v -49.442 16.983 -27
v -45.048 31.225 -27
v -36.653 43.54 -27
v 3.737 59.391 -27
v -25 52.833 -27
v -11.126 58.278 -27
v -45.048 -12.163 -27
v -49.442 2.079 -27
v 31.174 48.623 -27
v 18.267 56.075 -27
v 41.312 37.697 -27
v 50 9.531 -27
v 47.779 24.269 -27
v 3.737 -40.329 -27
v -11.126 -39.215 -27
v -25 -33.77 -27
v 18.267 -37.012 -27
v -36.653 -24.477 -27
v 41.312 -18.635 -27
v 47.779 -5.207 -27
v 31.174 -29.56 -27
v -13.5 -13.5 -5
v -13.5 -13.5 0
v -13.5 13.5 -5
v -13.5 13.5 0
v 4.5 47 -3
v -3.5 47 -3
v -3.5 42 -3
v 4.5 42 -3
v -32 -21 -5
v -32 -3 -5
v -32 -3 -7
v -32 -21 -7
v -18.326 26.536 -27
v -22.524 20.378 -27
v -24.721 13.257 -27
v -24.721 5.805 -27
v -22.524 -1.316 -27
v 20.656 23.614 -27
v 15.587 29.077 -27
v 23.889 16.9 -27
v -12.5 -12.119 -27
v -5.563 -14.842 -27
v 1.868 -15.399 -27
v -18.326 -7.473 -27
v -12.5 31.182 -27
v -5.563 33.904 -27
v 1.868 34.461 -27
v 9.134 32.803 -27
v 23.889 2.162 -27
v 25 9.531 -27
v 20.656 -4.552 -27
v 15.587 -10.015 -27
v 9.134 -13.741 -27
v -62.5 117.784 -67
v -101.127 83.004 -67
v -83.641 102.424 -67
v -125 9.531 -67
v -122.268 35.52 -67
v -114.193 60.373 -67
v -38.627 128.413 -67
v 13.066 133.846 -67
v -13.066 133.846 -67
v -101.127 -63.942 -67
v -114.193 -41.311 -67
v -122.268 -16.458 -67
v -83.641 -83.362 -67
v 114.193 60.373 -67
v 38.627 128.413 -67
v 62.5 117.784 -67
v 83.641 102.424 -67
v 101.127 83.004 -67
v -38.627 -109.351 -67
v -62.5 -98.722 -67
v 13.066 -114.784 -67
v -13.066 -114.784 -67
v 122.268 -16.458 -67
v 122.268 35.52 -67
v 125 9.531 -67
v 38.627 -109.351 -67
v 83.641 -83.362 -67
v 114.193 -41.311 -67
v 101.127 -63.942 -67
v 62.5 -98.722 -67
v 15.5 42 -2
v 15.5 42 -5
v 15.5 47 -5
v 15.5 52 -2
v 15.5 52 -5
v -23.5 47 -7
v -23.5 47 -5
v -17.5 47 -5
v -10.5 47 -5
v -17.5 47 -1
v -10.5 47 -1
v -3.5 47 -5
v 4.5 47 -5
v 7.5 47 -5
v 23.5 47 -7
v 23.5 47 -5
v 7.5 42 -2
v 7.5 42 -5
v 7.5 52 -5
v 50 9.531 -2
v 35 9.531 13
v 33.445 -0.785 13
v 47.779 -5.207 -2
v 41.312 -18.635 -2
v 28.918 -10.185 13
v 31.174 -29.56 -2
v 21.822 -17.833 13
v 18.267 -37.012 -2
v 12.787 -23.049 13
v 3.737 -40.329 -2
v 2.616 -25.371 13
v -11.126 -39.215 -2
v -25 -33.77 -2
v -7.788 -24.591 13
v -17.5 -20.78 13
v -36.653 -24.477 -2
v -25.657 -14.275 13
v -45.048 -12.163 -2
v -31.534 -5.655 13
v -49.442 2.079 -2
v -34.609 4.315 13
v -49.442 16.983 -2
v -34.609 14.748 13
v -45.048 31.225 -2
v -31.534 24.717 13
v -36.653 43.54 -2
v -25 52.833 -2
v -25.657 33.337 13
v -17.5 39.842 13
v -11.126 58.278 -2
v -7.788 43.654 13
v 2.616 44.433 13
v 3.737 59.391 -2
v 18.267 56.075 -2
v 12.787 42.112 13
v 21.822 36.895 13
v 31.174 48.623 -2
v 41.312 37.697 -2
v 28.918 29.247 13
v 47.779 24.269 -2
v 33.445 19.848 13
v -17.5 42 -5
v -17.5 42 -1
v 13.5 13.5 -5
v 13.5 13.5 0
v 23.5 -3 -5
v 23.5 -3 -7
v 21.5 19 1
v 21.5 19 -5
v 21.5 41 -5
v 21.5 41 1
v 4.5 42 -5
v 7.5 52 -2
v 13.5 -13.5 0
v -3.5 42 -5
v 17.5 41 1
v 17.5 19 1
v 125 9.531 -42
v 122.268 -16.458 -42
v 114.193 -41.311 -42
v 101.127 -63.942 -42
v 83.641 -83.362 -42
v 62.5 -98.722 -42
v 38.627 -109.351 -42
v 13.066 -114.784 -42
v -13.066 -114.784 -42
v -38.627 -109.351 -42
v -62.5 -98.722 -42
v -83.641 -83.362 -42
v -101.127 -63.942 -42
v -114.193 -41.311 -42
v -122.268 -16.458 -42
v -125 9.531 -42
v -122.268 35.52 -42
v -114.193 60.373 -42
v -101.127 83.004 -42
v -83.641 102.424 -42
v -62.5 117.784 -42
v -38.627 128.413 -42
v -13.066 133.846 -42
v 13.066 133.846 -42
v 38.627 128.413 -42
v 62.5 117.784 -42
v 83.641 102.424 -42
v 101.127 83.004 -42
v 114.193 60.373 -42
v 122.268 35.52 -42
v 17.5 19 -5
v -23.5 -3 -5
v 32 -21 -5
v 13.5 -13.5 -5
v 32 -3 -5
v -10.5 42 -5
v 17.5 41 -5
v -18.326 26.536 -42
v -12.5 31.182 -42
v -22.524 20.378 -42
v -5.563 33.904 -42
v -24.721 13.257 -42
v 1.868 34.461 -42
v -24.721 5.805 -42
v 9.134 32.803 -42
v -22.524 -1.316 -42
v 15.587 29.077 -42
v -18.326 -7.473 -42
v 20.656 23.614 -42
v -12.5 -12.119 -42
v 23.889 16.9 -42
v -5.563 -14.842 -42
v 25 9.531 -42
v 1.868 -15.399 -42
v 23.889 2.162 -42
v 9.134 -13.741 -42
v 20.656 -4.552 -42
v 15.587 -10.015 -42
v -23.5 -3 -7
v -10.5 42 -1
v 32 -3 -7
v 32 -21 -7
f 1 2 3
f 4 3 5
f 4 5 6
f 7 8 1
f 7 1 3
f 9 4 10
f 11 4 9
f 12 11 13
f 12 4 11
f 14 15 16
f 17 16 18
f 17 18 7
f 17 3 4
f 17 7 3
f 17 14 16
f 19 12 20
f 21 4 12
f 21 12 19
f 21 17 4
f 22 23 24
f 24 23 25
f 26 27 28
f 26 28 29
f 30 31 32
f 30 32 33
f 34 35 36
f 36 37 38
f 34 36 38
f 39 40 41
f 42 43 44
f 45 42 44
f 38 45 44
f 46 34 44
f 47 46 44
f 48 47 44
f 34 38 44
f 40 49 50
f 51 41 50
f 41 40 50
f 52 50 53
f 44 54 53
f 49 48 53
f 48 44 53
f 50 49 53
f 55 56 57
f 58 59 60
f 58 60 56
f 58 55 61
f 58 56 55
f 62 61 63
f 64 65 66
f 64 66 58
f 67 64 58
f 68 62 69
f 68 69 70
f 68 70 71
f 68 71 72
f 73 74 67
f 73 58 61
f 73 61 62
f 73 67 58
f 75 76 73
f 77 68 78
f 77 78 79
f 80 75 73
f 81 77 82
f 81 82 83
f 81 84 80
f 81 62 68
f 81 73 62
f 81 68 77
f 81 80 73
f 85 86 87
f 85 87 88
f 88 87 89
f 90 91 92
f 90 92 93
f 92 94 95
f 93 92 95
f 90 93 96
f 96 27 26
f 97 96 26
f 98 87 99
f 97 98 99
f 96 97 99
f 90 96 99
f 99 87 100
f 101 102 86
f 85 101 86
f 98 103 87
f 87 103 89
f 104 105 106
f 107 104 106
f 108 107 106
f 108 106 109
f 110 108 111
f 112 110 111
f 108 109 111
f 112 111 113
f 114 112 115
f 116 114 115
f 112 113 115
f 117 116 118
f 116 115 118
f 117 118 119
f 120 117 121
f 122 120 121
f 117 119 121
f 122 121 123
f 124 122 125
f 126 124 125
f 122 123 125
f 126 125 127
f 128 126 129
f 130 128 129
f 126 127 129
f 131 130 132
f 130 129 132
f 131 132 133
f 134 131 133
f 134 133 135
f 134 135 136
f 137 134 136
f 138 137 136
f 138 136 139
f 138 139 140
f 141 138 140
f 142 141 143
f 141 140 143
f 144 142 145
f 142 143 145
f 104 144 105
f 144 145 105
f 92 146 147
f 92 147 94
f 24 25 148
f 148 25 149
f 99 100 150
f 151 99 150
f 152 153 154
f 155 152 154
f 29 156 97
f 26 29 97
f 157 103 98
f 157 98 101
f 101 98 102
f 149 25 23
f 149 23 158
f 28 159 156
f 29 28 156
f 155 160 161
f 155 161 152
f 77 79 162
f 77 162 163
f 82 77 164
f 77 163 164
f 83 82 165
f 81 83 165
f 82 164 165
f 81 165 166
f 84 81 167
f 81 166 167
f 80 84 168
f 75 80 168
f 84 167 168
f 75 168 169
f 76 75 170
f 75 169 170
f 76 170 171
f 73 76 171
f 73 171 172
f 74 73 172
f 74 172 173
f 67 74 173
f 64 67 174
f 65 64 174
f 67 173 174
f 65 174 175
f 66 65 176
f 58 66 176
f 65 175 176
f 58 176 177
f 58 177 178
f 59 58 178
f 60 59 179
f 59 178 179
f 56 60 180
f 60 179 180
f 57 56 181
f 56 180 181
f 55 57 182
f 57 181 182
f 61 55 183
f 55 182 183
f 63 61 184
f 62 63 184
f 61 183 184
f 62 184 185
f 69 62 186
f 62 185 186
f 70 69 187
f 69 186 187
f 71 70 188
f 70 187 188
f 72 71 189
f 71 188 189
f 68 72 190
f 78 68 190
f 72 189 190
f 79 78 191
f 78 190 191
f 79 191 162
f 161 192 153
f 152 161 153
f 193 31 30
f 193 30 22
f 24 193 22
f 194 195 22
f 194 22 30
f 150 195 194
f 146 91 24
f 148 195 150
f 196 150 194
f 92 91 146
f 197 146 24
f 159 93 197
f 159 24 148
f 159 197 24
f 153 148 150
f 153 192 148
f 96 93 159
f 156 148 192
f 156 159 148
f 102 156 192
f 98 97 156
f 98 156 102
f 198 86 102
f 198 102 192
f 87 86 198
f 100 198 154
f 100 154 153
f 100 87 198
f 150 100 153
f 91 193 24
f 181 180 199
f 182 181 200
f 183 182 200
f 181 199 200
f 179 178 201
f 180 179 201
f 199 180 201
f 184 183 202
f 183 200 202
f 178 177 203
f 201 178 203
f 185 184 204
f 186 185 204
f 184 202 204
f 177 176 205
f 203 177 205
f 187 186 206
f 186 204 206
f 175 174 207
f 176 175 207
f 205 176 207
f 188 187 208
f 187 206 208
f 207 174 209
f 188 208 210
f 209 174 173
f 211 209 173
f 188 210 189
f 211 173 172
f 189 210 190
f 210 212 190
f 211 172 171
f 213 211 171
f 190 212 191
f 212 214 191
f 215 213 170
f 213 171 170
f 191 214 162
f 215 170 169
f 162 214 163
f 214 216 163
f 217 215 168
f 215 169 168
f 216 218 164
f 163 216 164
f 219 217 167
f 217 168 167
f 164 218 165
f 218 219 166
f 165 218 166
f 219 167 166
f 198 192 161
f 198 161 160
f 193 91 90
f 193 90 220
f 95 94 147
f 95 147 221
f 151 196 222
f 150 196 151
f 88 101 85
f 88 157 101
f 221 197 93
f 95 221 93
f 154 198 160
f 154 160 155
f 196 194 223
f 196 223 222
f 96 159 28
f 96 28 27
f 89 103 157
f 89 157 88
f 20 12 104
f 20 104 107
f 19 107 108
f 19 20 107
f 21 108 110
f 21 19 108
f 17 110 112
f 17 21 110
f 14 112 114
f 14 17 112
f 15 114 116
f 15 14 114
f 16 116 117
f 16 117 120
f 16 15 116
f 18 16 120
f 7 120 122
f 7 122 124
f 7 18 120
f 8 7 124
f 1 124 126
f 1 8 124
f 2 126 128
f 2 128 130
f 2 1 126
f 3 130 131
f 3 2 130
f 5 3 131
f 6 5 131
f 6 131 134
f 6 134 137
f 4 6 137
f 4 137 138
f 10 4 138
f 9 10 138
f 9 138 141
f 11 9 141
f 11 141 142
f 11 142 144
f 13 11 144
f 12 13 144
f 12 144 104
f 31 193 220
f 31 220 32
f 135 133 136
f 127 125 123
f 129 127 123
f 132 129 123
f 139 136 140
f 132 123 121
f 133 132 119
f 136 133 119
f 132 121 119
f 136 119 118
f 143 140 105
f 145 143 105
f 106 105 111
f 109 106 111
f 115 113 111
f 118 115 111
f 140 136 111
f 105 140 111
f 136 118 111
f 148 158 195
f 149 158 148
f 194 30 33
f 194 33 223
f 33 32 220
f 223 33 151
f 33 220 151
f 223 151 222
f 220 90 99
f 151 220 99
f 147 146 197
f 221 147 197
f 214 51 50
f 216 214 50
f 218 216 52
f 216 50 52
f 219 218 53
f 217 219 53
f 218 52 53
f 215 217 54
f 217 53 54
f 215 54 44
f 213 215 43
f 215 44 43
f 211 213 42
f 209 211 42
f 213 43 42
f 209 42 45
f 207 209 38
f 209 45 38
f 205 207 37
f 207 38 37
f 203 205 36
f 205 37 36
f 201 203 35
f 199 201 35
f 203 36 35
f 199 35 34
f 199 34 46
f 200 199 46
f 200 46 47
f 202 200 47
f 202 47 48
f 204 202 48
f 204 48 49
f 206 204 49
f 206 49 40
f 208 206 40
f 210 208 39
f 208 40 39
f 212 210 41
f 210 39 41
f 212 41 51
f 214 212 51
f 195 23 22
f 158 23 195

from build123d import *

# Parameters (mm, degrees)
F0_W           = 27
F0_H           = 27
F1_DEPTH       = 2
F3_W           = 47
F3_H           = 50
F4_DEPTH       = 2
F6_DEPTH       = 2
F7_DEPTH       = 3
F8_W           = 8
F8_H           = 5
F9_DEPTH       = 2
F10_W          = 8
F10_H          = 5
F11_DEPTH      = 3
F12_W          = 4
F12_H          = 22
F13_DEPTH      = 6
F14_W          = 7
F14_H          = 5
F15_DEPTH      = 4
F16_R          = 50
F16_R_2        = 47.5
F17_DEPTH      = 20
F17_DEPTH_BACK = 20
F18_SIZE       = 15
F19_R          = 25
F20_DEPTH      = 15
F21_R          = 125
F21_R_2        = 25
F22_DEPTH      = 25


with BuildPart() as f1:
    # F0 (on Top) → F1 (new body)
    with BuildSketch(Plane.XY):
        Rectangle(F0_W, F0_H)
    extrude(amount=-F1_DEPTH)


with BuildPart() as f4:
    # F3 (on offset) → F4 (new body)
    with BuildSketch(Plane(origin=(0, 0, -5), x_dir=(1, 0, 0), z_dir=(0, 0, -1))):
        with Locations((0, -22)):
            Rectangle(F3_W, F3_H)
    extrude(amount=F4_DEPTH)

    # F5 (on face) → F6 (join)
    with BuildSketch(Plane.XY.offset(-5)):
        Polygon((32, -21), (32, -3), (23.5, -3), (-23.5, -3), (-32, -3), (-32, -21), align=None)
    extrude(amount=-F6_DEPTH)

    # F8 (on face) → F9 (join)
    with BuildSketch(Plane.XY.offset(-5)):
        with Locations((0.5, 44.5)):
            Rectangle(F8_W, F8_H)
    extrude(amount=F9_DEPTH)

    # F10 (on face) → F11 (join)
    with BuildSketch(Plane.XY.offset(-5)):
        with Locations((11.5, 44.5)):
            Rectangle(F10_W, F10_H)
        with Locations((11.5, 49.5)):
            Rectangle(F10_W, F10_H)
    extrude(amount=F11_DEPTH)

    # F12 (on face) → F13 (join)
    with BuildSketch(Plane.XY.offset(-5)):
        with Locations((19.5, 30)):
            Rectangle(F12_W, F12_H)
    extrude(amount=F13_DEPTH)


with BuildPart() as f7:
    # F7 (new, through all): a face of the model
    f7_faces = [f1.part.faces().sort_by_distance(p)[0] for p in [
        (0, 0, -2),
    ]]
    extrude(f7_faces, amount=F7_DEPTH)


with BuildPart() as f1_1:
    add(f1.part)

    add(f4.part)  # F15 merges F4

    add(f7.part)  # F15 merges F7
    # F14 (on face) → F15 (join)
    with BuildSketch(Plane.XY.offset(-5)):
        with Locations((-14, 44.5)):
            Rectangle(F14_W, F14_H)
    extrude(amount=F15_DEPTH)


with BuildPart() as f17:
    # F16 (on face) → F17 (new body, two sides)
    with BuildSketch(Plane(origin=(0, 0, -7), x_dir=(1, 0, 0), z_dir=(0, 0, -1))) as f17_sk:
        with Locations((0, -9.53125)):
            Circle(F16_R)
        with Locations((0, -9.53125)):
            Circle(F16_R_2, mode=Mode.SUBTRACT)
        with Locations((0, -9.53125)):
            Circle(F16_R_2)
        Polygon((32, 21), (32, 3), (23.5, 3), (23.5, -47), (-23.5, -47), (-23.5, 3), (-32, 3), (-32, 21), align=None, mode=Mode.SUBTRACT)
        Polygon((23.5, 3), (32, 3), (32, 21), (-32, 21), (-32, 3), (-23.5, 3), (-23.5, -47), (23.5, -47), align=None)
    extrude(amount=F17_DEPTH)
    extrude(f17_sk.sketch, amount=-F17_DEPTH_BACK)

    # F18
    f18_edges = [f17.edges().sort_by_distance(p)[0] for p in [
        (-50, 9.53125, 13),
    ]]
    chamfer(f18_edges, length=F18_SIZE)


with BuildPart() as f20:
    # F19 (on face) → F20 (new body)
    with BuildSketch(Plane(origin=(0, 0, -27), x_dir=(1, 0, 0), z_dir=(0, 0, -1))):
        with Locations((0, -9.53125)):
            Circle(F19_R)
    extrude(amount=F20_DEPTH)

    # F21 (on face) → F22 (join)
    with BuildSketch(Plane(origin=(0, 0, -42), x_dir=(1, 0, 0), z_dir=(0, 0, -1))):
        with Locations((0, -9.53125)):
            Circle(F21_R)
        with Locations((0, -9.53125)):
            Circle(F21_R_2, mode=Mode.SUBTRACT)
        with Locations((0, -9.53125)):
            Circle(F21_R_2)
    extrude(amount=F22_DEPTH)


solid = Compound([f1_1.part, f17.part, f20.part])
